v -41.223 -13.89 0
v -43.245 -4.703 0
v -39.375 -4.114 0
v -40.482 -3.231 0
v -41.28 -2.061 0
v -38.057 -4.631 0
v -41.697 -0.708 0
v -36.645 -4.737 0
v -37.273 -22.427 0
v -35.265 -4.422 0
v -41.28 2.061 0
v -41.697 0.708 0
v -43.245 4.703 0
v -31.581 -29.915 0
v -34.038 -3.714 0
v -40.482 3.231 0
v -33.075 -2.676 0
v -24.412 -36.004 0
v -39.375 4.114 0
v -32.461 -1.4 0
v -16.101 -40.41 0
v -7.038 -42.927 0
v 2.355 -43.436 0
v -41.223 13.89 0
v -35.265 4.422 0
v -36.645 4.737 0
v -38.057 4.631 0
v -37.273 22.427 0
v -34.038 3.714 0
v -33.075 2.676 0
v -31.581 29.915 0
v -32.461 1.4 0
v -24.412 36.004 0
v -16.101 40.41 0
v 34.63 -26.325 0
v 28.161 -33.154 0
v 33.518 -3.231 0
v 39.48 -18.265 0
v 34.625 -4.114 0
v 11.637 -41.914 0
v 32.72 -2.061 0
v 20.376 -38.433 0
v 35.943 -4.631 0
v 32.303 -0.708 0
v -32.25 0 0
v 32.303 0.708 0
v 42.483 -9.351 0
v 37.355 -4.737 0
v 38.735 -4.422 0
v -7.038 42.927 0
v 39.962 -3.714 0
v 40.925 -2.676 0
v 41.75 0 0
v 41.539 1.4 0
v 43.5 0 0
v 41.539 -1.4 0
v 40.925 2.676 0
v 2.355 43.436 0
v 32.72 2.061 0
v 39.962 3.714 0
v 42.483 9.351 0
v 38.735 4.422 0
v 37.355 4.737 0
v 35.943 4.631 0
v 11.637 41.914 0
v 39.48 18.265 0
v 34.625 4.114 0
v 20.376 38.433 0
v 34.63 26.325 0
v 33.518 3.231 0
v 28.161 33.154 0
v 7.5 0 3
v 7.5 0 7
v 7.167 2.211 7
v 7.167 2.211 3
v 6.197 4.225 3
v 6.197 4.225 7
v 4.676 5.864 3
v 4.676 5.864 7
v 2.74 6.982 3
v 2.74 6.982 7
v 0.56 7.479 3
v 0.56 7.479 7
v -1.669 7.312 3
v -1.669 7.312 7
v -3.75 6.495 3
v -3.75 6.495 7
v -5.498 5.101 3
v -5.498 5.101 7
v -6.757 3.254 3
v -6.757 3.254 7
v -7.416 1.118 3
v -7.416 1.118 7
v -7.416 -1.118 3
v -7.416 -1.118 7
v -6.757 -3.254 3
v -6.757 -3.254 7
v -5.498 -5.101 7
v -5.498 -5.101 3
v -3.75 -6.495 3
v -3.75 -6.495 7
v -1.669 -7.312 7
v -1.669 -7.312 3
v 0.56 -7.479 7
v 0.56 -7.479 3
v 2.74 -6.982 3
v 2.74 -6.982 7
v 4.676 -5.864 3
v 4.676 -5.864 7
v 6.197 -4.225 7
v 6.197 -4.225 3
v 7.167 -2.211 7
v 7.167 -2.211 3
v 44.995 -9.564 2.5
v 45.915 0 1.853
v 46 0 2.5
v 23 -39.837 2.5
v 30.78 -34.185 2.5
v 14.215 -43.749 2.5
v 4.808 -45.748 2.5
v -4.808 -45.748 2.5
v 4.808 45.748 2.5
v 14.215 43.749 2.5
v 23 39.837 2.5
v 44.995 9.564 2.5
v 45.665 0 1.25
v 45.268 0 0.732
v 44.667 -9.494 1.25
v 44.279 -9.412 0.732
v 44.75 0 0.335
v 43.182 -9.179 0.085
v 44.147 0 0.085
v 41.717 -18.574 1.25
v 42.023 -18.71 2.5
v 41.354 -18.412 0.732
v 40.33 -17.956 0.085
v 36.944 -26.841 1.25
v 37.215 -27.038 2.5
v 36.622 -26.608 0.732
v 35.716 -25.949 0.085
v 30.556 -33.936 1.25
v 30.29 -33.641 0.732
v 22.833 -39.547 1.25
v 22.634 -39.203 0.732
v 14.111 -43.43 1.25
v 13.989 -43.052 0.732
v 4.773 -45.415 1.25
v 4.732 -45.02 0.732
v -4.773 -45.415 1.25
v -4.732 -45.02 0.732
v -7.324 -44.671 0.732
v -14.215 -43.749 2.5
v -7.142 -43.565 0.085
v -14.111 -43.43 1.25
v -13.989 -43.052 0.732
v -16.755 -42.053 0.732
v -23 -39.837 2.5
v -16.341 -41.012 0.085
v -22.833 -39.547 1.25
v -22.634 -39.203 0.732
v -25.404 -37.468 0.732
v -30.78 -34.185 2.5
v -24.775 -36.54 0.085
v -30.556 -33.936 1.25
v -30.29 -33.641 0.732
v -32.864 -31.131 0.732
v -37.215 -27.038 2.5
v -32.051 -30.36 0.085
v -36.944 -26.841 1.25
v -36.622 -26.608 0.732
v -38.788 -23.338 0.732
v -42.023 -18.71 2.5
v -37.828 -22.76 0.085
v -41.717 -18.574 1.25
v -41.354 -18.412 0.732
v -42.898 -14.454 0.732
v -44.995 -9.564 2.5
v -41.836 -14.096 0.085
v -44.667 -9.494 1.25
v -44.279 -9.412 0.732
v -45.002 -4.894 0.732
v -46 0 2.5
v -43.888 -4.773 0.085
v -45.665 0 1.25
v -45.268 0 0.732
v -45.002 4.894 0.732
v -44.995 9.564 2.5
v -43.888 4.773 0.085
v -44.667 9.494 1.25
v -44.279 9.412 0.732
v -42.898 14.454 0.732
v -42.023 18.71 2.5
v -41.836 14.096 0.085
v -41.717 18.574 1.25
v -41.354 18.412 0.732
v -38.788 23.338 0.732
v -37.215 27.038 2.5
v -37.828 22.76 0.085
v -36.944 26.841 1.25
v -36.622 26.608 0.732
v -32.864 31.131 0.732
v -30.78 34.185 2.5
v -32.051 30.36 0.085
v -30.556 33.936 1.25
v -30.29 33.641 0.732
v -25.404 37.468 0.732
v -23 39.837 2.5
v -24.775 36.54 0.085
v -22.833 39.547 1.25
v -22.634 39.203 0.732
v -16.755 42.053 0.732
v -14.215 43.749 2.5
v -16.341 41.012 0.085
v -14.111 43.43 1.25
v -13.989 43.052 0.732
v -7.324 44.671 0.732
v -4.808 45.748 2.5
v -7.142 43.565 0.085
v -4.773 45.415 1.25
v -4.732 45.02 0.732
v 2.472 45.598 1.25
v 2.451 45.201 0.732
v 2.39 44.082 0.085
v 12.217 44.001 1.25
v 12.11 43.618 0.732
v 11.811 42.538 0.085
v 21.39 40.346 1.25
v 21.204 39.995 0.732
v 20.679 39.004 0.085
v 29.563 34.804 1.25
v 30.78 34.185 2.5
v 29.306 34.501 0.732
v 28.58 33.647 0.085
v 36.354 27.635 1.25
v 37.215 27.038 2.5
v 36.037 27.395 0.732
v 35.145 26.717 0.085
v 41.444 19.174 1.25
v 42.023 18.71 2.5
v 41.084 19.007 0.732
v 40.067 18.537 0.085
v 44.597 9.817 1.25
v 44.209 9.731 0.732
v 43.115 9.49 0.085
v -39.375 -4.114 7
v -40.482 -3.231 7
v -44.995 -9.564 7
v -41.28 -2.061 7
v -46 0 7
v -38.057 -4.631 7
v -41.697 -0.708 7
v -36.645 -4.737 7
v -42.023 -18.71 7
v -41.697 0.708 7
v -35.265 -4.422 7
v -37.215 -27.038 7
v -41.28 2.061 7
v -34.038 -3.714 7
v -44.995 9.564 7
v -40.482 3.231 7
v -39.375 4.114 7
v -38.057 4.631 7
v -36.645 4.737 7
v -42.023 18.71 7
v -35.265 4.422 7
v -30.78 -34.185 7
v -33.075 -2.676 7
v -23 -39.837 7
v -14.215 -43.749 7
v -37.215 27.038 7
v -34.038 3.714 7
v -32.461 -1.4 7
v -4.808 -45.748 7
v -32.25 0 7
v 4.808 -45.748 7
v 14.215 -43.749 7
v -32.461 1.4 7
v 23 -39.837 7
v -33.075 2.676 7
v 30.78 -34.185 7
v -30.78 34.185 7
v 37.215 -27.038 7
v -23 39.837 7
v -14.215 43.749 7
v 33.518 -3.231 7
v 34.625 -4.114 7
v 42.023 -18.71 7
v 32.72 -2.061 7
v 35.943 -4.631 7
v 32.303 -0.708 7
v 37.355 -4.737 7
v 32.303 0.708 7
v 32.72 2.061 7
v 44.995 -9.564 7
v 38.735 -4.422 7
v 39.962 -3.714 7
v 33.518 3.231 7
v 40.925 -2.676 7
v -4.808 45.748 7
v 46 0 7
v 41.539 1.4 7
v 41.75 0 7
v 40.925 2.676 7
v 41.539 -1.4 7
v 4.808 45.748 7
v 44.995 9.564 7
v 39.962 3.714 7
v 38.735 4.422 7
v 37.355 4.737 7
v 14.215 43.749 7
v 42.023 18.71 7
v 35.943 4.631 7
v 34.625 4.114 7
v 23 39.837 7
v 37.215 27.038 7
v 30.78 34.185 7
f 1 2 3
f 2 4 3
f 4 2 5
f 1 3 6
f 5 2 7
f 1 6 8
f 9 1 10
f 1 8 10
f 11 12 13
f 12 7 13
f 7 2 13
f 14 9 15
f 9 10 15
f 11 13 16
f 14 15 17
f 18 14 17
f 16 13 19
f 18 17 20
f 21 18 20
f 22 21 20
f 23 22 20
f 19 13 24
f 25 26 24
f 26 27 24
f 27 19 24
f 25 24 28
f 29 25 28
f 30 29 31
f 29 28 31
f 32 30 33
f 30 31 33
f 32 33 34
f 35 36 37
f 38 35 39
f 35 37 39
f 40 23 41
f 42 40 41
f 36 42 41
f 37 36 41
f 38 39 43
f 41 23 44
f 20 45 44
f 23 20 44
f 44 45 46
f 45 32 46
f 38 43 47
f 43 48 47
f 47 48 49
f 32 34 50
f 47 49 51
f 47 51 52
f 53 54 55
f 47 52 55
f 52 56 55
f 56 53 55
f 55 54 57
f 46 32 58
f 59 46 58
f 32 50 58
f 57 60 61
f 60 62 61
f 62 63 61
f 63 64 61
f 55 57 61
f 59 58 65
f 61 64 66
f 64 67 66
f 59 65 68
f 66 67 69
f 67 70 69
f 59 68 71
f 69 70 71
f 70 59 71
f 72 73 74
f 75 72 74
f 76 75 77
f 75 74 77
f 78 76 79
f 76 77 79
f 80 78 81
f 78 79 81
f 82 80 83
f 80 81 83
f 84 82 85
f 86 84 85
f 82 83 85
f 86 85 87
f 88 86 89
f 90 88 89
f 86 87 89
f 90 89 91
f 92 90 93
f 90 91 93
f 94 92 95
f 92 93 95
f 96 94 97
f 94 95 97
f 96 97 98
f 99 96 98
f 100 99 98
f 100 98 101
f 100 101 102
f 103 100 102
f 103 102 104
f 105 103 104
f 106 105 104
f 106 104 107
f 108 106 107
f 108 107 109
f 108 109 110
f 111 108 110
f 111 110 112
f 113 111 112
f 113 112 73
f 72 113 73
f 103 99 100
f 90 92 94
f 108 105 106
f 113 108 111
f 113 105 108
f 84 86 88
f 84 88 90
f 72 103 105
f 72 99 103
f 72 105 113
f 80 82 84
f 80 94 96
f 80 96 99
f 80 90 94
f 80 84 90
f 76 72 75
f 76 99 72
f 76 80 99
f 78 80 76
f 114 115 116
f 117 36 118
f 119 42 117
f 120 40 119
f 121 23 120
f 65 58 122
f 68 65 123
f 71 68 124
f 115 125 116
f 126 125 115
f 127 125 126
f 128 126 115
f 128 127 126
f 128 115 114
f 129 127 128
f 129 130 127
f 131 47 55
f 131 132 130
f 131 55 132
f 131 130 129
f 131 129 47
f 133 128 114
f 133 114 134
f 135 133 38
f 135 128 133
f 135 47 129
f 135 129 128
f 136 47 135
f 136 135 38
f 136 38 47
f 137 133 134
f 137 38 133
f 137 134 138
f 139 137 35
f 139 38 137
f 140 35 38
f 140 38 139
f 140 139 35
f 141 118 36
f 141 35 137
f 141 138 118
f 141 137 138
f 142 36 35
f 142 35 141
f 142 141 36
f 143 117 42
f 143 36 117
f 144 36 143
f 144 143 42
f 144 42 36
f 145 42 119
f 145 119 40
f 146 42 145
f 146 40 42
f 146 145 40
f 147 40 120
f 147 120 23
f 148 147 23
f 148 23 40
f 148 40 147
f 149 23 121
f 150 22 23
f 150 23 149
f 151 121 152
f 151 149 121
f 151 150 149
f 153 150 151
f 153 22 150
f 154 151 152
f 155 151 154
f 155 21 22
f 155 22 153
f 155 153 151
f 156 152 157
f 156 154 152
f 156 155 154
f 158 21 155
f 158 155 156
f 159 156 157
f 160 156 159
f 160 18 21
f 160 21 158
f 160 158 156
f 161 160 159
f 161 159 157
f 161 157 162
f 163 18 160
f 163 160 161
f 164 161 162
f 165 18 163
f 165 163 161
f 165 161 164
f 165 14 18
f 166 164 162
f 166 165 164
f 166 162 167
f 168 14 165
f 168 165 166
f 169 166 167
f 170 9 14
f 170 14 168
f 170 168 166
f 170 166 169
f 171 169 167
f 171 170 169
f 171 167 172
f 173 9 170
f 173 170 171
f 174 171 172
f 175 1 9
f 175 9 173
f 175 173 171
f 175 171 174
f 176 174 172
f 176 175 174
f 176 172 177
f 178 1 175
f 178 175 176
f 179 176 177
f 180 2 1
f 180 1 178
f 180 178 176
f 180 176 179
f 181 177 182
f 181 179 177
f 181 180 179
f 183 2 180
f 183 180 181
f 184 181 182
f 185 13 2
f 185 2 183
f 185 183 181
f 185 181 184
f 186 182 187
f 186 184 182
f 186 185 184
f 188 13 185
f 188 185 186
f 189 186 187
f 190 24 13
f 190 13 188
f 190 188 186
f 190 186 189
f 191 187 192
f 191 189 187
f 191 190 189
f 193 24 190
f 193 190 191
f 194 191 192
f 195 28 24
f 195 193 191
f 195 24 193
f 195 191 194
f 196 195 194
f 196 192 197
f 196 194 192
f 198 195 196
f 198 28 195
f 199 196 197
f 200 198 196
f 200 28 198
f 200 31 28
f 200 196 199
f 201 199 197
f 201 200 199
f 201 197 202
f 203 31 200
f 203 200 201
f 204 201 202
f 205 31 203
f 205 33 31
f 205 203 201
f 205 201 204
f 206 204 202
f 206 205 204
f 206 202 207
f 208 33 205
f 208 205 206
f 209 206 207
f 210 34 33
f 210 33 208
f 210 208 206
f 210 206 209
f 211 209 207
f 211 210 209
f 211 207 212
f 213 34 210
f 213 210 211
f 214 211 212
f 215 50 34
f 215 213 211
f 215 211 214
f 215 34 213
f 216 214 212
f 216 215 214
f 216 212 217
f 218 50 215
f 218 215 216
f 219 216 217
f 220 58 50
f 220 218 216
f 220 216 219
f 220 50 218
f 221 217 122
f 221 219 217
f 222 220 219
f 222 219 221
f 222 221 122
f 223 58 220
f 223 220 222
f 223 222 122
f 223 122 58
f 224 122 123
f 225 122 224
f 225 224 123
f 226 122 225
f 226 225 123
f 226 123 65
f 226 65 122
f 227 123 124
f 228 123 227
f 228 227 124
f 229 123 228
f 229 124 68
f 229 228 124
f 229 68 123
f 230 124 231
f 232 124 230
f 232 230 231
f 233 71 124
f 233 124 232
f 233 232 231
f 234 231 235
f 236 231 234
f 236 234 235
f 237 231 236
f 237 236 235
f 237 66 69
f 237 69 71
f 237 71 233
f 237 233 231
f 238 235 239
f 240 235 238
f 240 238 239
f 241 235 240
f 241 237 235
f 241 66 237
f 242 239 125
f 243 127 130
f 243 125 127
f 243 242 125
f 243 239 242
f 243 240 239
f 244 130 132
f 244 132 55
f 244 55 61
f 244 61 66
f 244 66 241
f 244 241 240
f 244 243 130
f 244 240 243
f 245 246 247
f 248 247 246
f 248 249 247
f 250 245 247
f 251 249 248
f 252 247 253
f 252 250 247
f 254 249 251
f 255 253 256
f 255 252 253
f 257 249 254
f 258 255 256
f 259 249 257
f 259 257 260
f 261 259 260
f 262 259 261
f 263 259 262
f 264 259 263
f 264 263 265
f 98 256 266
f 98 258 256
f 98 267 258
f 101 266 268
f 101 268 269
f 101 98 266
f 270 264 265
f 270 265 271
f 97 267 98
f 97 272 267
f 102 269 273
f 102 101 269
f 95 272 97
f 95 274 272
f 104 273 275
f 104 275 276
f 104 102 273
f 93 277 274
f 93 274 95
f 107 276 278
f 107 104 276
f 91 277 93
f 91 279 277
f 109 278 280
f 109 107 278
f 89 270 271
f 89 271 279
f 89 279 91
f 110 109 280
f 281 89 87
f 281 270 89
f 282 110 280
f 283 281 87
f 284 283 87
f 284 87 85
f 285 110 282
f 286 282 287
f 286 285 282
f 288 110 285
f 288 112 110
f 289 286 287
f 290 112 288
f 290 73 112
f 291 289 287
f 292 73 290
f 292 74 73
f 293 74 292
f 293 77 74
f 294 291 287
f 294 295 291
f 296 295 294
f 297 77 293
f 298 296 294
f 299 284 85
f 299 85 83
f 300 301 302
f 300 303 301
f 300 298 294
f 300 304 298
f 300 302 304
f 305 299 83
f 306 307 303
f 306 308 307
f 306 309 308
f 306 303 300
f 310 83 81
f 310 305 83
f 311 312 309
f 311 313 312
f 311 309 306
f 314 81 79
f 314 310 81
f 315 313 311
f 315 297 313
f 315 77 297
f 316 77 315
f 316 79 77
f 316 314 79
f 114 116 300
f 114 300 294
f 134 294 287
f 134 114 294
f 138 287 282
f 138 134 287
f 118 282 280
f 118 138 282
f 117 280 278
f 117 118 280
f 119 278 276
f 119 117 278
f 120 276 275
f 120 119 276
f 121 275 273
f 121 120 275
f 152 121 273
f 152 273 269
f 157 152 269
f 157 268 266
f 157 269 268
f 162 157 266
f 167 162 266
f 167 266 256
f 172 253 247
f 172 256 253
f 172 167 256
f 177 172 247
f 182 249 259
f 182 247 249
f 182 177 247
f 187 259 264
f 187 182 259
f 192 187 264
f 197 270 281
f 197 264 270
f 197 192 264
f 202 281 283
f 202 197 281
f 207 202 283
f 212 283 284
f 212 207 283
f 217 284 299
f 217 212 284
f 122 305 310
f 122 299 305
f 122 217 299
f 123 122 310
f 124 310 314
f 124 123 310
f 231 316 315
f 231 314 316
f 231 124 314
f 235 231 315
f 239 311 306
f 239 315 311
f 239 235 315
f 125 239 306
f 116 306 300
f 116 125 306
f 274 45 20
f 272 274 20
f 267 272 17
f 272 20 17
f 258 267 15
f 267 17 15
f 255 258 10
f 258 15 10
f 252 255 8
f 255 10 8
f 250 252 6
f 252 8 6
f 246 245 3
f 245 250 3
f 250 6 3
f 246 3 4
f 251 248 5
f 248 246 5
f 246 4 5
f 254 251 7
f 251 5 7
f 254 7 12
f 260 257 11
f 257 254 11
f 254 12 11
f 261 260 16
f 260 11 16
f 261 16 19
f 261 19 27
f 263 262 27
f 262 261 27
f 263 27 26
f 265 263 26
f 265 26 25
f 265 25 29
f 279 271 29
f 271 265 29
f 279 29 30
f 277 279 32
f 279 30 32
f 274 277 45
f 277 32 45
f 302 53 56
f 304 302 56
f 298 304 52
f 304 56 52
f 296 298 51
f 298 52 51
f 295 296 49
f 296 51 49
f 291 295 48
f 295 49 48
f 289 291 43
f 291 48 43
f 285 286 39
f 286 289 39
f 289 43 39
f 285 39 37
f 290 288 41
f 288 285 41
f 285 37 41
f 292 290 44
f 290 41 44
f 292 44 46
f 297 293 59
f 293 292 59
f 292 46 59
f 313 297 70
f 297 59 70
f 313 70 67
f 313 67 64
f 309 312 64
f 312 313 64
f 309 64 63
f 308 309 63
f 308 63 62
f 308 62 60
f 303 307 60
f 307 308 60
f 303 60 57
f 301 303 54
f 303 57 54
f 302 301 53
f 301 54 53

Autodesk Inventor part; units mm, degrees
ref_plane "YZ Plane" through (0, 0, 0) normal (1, 0, 0) x (0, 1, 0)
ref_plane "XZ Plane" through (0, 0, 0) normal (0, 1, 0) x (-1, 0, 0)
ref_plane "XY Plane" through (0, 0, 0) normal (0, 0, 1) x (1, 0, 0)
sketch "Sketch1" plane through (0, 0, 0) normal (0, 0, 1) x (1, 0, 0)
  circle A0 centre (0, 0) radius 46
  circle A1 centre (-37, 0) radius 4.75
  circle A2 centre (37, 0) radius 4.75
  dimension "d0" = 92
  dimension "d7" = 9.5
  dimension "d8" = 9.5
  dimension "d9" = 74
  dimension "d10" = 37
extrude "Extrusion1" add sketch "Sketch1" along normal blind 7
sketch "Sketch2" plane through (0, 0, 7) normal (0, 0, 1) x (1, 0, 0)
  circle A0 centre (0, 0) radius 46 projected
  circle A1 centre (0, 0) radius 7.5
  dimension "d3" = 15
extrude "Extrusion2" cut sketch "Sketch2" against normal blind 4 contours A1
fillet "Fillet1" radius 2.5 1 edges at (-46, 0, 0)
equation "\"d10\" = 0.5 * d9"
properties part number "ANTI-SKID PAD 100mm WITH ATTACHMENT BORES" material "Rubber"
